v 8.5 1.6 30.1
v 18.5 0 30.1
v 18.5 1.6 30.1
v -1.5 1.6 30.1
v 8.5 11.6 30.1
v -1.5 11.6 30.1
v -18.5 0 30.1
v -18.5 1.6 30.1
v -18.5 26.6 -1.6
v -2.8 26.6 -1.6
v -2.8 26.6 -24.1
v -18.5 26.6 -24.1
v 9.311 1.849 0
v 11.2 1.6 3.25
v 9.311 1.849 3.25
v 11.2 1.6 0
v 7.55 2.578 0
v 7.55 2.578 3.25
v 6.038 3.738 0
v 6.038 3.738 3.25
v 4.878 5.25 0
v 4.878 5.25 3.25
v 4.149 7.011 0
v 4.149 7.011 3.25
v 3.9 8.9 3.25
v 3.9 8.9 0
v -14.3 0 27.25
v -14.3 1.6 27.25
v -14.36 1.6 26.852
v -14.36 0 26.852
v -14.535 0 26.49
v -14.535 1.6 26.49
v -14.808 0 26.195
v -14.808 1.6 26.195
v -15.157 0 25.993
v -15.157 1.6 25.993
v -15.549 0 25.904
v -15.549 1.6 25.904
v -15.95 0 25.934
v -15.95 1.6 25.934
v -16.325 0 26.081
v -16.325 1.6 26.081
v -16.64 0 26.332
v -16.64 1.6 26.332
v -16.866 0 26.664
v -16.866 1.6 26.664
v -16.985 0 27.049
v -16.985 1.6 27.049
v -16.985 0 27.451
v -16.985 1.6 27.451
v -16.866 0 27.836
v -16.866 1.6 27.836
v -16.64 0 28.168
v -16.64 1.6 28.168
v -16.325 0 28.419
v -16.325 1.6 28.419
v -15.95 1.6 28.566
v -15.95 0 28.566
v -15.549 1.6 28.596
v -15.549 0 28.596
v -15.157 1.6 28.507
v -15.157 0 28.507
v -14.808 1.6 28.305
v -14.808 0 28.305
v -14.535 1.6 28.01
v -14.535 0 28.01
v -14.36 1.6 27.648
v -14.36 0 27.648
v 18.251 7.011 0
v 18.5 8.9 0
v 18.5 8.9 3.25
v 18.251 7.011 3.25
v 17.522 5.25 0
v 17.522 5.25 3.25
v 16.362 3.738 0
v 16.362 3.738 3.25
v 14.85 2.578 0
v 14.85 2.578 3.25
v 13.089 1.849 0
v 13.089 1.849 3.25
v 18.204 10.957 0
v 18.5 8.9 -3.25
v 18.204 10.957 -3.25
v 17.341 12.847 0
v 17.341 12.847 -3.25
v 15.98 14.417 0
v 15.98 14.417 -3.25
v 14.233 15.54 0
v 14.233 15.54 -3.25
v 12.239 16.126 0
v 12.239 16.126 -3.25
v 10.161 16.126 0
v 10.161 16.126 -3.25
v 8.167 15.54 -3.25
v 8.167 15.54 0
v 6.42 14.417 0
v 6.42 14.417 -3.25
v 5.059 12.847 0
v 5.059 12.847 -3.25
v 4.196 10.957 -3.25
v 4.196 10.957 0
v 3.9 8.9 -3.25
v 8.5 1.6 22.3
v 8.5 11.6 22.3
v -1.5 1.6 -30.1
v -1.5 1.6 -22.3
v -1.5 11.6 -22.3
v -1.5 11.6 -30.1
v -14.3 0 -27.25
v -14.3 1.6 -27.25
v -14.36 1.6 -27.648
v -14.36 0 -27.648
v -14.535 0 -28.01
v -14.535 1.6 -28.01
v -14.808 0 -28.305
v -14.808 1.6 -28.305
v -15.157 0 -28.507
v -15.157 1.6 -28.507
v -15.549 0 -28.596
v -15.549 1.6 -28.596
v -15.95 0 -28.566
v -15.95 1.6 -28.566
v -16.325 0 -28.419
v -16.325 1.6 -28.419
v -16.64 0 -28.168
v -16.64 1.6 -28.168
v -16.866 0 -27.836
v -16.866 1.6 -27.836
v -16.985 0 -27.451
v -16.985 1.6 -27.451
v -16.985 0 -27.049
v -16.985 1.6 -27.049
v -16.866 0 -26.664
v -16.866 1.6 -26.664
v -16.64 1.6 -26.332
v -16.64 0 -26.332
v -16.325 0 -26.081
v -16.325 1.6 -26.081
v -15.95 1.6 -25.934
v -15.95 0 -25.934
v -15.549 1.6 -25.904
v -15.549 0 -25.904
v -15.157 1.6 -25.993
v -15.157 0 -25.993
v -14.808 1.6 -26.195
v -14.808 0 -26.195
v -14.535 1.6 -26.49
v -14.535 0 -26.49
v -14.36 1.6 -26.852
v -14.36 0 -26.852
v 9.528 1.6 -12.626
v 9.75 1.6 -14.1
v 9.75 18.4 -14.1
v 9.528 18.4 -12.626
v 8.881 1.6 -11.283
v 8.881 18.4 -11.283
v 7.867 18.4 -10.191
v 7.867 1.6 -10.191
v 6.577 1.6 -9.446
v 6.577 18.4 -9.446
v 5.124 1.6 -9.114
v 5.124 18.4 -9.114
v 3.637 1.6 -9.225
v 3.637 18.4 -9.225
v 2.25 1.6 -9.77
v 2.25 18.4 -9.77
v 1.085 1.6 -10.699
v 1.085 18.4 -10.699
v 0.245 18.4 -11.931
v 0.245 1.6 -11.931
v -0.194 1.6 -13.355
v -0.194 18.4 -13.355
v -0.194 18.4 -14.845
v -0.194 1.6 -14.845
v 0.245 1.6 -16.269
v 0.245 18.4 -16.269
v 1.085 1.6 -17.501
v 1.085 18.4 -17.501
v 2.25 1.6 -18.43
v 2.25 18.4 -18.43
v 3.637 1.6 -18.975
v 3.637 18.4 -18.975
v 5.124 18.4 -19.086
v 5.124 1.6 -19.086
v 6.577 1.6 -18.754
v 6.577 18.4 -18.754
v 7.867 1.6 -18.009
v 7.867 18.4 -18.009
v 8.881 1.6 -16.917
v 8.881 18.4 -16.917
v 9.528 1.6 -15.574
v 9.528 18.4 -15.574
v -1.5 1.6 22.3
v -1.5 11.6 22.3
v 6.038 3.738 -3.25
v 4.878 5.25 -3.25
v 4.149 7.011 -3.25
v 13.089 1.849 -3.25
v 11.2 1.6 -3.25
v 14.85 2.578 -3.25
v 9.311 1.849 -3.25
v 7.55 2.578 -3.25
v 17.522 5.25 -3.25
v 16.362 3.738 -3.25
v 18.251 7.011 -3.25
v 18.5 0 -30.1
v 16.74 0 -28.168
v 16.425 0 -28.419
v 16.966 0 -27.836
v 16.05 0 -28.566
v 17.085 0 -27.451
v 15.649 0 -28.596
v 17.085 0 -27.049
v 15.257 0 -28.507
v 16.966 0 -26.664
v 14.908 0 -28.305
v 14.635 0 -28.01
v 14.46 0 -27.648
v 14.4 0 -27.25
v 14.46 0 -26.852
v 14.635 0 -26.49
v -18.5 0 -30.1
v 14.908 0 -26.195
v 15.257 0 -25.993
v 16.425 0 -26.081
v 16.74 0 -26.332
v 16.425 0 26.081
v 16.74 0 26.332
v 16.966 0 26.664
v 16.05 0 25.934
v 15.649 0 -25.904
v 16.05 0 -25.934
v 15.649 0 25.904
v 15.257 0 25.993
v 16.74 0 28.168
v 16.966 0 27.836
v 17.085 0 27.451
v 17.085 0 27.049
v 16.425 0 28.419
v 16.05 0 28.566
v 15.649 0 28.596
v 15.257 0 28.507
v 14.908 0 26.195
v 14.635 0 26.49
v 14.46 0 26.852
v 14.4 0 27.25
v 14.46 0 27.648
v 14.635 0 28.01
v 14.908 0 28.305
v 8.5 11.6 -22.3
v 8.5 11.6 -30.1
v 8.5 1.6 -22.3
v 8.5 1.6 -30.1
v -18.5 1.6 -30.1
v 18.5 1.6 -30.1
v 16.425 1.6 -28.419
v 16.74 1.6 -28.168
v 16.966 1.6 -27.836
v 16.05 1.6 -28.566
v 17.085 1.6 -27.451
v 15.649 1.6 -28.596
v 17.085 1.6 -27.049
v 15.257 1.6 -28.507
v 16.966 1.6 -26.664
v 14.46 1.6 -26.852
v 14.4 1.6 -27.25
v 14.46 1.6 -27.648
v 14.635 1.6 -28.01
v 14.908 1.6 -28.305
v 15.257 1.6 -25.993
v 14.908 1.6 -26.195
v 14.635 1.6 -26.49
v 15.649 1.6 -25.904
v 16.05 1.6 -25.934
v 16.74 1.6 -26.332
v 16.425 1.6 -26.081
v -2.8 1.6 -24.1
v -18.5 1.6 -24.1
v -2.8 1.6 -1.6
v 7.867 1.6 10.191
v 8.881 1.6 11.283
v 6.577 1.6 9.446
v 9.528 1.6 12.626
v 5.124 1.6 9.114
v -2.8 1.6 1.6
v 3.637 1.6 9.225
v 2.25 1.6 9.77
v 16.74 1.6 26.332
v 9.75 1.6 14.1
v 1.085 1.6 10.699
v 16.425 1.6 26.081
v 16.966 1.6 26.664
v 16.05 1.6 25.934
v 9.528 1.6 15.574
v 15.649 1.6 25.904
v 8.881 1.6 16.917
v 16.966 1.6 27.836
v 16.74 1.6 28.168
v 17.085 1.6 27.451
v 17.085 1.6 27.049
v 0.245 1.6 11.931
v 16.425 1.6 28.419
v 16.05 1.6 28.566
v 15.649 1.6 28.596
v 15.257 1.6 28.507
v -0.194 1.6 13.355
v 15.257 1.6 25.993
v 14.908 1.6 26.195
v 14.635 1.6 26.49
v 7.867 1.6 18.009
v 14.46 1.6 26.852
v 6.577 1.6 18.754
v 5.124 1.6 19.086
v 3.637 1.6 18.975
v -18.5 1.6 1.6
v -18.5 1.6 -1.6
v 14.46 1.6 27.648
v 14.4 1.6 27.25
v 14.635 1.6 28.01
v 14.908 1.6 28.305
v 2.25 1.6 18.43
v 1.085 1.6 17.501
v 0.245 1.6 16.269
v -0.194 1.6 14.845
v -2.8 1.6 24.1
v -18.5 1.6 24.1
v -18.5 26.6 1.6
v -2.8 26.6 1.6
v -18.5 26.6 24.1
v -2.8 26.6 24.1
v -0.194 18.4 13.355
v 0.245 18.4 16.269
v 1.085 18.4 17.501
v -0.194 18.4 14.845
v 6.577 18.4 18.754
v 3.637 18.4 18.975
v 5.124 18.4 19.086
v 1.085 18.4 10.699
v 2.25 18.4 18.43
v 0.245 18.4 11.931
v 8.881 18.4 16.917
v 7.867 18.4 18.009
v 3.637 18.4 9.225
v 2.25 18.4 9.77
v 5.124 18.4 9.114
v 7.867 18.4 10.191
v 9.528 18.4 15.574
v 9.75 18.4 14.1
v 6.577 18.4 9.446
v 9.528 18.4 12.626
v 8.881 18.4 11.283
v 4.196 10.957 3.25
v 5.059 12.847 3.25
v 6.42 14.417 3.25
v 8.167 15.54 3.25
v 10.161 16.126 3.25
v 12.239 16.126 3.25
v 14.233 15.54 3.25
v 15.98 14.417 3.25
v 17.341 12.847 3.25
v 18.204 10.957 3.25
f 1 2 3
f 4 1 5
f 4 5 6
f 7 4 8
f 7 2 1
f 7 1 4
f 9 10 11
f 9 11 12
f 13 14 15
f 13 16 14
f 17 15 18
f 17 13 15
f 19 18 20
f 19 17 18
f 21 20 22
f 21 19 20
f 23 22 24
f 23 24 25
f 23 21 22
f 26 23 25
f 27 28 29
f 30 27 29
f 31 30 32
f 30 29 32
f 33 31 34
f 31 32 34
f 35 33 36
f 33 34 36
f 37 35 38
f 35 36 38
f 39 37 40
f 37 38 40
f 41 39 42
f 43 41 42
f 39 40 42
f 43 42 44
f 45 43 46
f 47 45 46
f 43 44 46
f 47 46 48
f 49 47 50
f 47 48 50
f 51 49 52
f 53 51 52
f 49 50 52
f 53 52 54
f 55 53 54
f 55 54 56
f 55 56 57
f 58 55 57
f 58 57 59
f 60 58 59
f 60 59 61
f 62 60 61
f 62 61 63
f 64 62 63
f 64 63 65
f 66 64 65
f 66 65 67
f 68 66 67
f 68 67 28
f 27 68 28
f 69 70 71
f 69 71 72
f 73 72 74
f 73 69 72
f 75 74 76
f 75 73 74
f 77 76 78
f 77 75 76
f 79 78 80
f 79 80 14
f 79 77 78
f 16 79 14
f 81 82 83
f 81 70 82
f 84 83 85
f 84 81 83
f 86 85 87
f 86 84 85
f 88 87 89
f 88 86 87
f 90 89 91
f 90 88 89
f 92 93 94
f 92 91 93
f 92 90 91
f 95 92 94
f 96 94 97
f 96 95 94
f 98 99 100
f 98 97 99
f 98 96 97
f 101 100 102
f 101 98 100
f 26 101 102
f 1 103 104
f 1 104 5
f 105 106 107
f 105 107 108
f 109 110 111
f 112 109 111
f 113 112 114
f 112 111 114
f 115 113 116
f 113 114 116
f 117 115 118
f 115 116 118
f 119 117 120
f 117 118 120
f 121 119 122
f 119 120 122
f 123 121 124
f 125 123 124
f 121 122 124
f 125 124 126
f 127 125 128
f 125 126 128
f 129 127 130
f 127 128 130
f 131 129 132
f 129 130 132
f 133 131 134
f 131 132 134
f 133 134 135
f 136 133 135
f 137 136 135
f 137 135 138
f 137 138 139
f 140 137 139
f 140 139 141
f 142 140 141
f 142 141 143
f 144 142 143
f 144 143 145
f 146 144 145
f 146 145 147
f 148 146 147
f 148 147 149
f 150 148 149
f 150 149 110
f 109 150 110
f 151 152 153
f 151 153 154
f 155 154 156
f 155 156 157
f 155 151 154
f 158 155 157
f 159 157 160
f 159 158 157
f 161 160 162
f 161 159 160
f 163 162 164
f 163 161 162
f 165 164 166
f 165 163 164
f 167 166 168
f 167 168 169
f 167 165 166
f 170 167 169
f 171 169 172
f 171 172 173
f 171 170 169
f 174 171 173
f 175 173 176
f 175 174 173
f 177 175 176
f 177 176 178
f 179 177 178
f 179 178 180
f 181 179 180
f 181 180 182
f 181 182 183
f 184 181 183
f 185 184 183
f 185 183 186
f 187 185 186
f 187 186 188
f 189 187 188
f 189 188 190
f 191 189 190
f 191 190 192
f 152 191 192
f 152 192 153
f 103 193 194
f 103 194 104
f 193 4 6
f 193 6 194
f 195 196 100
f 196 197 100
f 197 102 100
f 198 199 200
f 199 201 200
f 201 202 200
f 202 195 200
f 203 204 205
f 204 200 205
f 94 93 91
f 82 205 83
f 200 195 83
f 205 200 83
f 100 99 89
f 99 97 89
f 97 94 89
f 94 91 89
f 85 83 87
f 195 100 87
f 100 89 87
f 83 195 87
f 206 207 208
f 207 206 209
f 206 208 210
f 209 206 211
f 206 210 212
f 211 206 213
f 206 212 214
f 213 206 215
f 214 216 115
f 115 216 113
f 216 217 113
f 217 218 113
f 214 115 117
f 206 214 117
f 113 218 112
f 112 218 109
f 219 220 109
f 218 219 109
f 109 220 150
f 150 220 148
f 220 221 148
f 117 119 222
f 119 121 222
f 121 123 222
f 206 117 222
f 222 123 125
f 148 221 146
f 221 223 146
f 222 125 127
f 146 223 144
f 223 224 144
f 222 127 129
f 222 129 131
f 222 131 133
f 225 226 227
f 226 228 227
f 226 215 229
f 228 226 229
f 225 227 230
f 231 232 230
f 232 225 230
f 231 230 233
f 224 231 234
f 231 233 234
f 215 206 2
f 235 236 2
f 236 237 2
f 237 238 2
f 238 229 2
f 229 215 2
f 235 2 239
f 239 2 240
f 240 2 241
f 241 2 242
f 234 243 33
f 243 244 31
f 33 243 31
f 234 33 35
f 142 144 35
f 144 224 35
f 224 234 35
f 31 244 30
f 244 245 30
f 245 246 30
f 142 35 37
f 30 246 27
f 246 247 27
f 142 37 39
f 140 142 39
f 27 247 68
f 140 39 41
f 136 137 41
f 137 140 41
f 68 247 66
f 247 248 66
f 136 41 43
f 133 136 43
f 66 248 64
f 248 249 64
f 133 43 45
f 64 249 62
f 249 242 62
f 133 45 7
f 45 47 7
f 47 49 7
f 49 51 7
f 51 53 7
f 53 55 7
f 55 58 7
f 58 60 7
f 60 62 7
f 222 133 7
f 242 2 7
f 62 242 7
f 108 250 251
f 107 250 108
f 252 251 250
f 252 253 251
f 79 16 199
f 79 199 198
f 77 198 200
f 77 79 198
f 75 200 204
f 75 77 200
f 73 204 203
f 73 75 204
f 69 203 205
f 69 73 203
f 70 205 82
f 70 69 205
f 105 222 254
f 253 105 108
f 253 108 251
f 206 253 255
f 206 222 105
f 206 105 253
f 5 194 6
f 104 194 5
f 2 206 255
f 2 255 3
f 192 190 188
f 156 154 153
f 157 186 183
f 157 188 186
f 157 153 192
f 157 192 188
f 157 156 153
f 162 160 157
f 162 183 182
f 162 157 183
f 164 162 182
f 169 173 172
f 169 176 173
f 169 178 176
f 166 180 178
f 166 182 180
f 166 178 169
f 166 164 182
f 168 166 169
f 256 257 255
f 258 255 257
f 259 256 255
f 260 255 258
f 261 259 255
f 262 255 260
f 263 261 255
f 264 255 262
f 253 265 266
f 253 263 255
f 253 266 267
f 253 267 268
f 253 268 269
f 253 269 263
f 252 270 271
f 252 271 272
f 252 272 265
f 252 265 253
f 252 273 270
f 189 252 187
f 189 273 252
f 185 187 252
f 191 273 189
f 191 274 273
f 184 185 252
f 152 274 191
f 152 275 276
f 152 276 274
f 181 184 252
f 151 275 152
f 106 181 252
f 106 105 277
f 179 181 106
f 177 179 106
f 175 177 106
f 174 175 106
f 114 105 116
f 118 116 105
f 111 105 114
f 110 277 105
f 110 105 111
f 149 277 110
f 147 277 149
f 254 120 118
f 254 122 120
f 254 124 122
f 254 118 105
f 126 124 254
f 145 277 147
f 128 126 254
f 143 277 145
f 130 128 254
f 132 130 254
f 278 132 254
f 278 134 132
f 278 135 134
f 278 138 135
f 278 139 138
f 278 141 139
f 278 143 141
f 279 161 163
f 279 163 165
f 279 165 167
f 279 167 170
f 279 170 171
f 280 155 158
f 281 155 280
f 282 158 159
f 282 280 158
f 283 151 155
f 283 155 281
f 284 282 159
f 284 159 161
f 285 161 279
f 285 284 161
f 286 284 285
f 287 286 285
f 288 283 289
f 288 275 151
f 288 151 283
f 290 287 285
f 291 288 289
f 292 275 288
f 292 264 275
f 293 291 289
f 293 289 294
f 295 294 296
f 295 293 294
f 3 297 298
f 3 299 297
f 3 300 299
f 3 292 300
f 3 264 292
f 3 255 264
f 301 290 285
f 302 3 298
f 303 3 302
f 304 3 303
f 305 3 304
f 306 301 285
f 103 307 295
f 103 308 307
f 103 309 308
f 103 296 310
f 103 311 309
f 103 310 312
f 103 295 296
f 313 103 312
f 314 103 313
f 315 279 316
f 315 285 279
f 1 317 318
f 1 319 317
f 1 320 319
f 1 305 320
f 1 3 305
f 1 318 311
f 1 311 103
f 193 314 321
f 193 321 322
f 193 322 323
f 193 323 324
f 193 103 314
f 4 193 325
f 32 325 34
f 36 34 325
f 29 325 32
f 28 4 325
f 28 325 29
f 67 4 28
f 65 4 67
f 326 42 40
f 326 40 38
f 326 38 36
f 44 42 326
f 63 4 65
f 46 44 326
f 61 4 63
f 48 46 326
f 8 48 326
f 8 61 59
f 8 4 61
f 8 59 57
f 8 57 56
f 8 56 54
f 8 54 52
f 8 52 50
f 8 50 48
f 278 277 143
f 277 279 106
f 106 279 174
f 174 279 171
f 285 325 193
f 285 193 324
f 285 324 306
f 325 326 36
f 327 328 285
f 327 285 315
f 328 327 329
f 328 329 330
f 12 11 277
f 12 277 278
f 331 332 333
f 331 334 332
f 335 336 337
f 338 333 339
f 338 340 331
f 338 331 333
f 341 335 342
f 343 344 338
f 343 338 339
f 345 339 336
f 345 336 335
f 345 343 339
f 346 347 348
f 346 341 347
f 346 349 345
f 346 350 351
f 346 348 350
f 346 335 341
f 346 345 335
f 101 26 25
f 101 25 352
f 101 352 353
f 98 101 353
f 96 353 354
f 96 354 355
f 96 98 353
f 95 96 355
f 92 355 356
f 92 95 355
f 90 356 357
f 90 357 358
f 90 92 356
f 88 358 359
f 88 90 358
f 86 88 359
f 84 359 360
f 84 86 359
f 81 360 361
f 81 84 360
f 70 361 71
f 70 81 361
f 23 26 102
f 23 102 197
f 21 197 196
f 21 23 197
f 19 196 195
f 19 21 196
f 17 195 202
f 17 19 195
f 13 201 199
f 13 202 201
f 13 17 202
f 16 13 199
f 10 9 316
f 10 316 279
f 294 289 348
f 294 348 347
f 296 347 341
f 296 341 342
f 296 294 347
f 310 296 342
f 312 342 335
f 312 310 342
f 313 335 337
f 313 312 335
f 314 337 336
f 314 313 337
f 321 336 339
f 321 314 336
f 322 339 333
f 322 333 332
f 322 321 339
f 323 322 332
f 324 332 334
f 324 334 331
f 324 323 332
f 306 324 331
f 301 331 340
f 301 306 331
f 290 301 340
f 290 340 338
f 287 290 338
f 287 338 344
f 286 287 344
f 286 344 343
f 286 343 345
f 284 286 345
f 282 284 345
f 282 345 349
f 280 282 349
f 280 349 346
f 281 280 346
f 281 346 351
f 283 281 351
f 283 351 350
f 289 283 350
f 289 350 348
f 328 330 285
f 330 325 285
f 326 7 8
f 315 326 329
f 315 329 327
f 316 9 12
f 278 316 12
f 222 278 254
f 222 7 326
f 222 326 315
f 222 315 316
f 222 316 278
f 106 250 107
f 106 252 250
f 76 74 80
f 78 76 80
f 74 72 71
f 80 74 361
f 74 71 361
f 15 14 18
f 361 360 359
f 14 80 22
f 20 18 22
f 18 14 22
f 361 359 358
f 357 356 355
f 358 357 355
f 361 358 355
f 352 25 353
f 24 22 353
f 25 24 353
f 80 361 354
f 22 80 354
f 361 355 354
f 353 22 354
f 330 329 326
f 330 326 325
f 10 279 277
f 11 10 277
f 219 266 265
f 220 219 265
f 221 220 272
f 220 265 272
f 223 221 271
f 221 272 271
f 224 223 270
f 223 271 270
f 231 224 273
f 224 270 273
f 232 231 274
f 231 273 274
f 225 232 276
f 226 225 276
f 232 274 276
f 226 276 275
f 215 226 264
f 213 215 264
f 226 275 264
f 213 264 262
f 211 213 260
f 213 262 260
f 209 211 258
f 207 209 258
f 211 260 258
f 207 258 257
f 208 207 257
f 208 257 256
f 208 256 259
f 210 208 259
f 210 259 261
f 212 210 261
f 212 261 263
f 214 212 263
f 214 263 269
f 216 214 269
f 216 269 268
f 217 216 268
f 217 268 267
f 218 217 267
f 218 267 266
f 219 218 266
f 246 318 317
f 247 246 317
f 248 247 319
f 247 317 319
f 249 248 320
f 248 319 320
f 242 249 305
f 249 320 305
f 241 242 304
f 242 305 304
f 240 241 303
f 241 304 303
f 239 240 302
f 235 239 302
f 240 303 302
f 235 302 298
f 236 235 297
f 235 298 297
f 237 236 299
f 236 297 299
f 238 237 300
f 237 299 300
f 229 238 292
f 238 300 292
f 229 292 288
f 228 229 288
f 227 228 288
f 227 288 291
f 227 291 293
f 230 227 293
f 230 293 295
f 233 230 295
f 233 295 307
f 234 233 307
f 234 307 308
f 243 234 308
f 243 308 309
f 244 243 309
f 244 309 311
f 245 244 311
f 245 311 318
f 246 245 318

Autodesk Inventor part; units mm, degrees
ref_plane "YZ Plane" through (0, 0, 0) normal (1, 0, 0) x (0, 1, 0)
sketch "Sketch1" plane through (0, 0, 0) normal (0, 1, 0) x (-1, 0, 0)
  line L0 (-18.5, 30.1) -> (18.5, 30.1)
  line L1 (18.5, 30.1) -> (18.5, -30.1)
  line L2 (18.5, -30.1) -> (-18.5, -30.1)
  line L3 (-18.5, -30.1) -> (-18.5, 30.1)
  line L4 (-18.5, 30.1) -> (18.5, -30.1) construction
  line L5 (18.5, 30.1) -> (-18.5, -30.1) construction
  point P0 (0, 0)
  dimension "d0" = 37
  dimension "d1" = 60.2
extrude "Extrusion1" add sketch "Sketch1" along normal blind 1.6
sketch "Sketch2" plane through (0, 1.6, 0) normal (0, 1, 0) x (1, 0, 0)
  line L0 (-18.5, -30.1) -> (18.5, -30.1) projected
  line L1 (18.5, -30.1) -> (8.5, -30.1)
  line L2 (8.5, -30.1) -> (-1.5, -30.1)
  line L3 (-1.5, -30.1) -> (-1.5, -22.3)
  line L4 (-1.5, -22.3) -> (8.5, -22.3)
  line L5 (8.5, -22.3) -> (8.5, -30.1)
  point P0 (0, 0)
  point P1 (-1.5, -30.1)
  dimension "d4" = 10
  dimension "d5" = 10
  dimension "d6" = 7.8
extrude "Extrusion2" add sketch "Sketch2" along normal blind 10
sketch "Sketch3" plane through (0, 1.6, 0) normal (0, 1, 0) x (1, 0, 0)
  line L0 (-18.5, -30.1) -> (18.5, -30.1) projected
  line L1 (18.5, -30.1) -> (4.75, -30.1)
  line L2 (4.75, -30.1) -> (4.75, -14.1)
  circle A0 centre (4.75, -14.1) radius 5
  point P0 (0, 0)
  dimension "d9" = 13.75
  dimension "d10" = 16
  dimension "d11" = 10
extrude "Extrusion3" add sketch "Sketch3" along normal blind 16.8
sketch "Sketch4" plane through (0, 1.6, 0) normal (0, 1, 0) x (1, 0, 0)
  line L0 (-18.5, -30.1) -> (-1.5, -30.1) projected
  line L1 (-18.5, -30.1) -> (-18.5, -24.1)
  line L2 (-18.5, 30.1) -> (-18.5, -30.1) projected
  line L3 (-18.5, -24.1) -> (-2.8, -24.1)
  line L4 (-2.8, -24.1) -> (-2.8, -1.6)
  line L5 (-2.8, -1.6) -> (-18.5, -1.6)
  line L6 (-18.5, -1.6) -> (-18.5, -24.1)
  point P0 (0, 0)
  dimension "d14" = 6
  dimension "d15" = 15.7
  dimension "d16" = 22.5
extrude "Extrusion4" add sketch "Sketch4" along normal blind 25
ref_plane "Work Plane1" through (18.5, 0, 0) normal (0, 0, -1) x (-1, 0, 0)
sketch "Sketch6" plane through (18.5, 0, 0) normal (0, 0, -1) x (-1, 0, 0)
  line L0 (0, 1.6) -> (0, 8.9)
  line L1 (0, 8.9) -> (7.3, 8.9)
  circle A0 centre (7.3, 8.9) radius 7.3
  point P0 (18.5, 0)
  dimension "d25" = 7.3
  dimension "d26" = 7.3
  dimension "d27" = 14.6
extrude "Extrusion6" add sketch "Sketch6" against normal blind 3.25
mirror "Mirror2" about plane through (18.5, 0, 0) normal (0, 0, -1) of "Extrusion4", "Extrusion2", "Extrusion3", "Extrusion6"
sketch "Sketch7" plane through (0, 1.6, 0) normal (0, 1, 0) x (1, 0, 0)
  circle A0 centre (-15.65, 27.25) radius 1.35
  line L0 (-18.5, 30.1) -> (-18.5, 24.1) projected
  point P0 (0, 0)
  dimension "d32" = 2.7
  dimension "d36" = 2.85
  dimension "d37" = 2.85
extrude "Extrusion7" cut sketch "Sketch7" against normal blind 3.25
ref_plane "Work Plane2" through (0.05, 0, 30.1) normal (1, 0, 0) x (0, 0, -1)
mirror "Mirror3" about plane through (0.05, 0, 30.1) normal (1, 0, 0) of "Extrusion7"
mirror "Mirror4" about plane through (18.5, 0, 0) normal (0, 0, -1) of "Extrusion7", "Mirror3"
properties part number "ConversosDCDC"
